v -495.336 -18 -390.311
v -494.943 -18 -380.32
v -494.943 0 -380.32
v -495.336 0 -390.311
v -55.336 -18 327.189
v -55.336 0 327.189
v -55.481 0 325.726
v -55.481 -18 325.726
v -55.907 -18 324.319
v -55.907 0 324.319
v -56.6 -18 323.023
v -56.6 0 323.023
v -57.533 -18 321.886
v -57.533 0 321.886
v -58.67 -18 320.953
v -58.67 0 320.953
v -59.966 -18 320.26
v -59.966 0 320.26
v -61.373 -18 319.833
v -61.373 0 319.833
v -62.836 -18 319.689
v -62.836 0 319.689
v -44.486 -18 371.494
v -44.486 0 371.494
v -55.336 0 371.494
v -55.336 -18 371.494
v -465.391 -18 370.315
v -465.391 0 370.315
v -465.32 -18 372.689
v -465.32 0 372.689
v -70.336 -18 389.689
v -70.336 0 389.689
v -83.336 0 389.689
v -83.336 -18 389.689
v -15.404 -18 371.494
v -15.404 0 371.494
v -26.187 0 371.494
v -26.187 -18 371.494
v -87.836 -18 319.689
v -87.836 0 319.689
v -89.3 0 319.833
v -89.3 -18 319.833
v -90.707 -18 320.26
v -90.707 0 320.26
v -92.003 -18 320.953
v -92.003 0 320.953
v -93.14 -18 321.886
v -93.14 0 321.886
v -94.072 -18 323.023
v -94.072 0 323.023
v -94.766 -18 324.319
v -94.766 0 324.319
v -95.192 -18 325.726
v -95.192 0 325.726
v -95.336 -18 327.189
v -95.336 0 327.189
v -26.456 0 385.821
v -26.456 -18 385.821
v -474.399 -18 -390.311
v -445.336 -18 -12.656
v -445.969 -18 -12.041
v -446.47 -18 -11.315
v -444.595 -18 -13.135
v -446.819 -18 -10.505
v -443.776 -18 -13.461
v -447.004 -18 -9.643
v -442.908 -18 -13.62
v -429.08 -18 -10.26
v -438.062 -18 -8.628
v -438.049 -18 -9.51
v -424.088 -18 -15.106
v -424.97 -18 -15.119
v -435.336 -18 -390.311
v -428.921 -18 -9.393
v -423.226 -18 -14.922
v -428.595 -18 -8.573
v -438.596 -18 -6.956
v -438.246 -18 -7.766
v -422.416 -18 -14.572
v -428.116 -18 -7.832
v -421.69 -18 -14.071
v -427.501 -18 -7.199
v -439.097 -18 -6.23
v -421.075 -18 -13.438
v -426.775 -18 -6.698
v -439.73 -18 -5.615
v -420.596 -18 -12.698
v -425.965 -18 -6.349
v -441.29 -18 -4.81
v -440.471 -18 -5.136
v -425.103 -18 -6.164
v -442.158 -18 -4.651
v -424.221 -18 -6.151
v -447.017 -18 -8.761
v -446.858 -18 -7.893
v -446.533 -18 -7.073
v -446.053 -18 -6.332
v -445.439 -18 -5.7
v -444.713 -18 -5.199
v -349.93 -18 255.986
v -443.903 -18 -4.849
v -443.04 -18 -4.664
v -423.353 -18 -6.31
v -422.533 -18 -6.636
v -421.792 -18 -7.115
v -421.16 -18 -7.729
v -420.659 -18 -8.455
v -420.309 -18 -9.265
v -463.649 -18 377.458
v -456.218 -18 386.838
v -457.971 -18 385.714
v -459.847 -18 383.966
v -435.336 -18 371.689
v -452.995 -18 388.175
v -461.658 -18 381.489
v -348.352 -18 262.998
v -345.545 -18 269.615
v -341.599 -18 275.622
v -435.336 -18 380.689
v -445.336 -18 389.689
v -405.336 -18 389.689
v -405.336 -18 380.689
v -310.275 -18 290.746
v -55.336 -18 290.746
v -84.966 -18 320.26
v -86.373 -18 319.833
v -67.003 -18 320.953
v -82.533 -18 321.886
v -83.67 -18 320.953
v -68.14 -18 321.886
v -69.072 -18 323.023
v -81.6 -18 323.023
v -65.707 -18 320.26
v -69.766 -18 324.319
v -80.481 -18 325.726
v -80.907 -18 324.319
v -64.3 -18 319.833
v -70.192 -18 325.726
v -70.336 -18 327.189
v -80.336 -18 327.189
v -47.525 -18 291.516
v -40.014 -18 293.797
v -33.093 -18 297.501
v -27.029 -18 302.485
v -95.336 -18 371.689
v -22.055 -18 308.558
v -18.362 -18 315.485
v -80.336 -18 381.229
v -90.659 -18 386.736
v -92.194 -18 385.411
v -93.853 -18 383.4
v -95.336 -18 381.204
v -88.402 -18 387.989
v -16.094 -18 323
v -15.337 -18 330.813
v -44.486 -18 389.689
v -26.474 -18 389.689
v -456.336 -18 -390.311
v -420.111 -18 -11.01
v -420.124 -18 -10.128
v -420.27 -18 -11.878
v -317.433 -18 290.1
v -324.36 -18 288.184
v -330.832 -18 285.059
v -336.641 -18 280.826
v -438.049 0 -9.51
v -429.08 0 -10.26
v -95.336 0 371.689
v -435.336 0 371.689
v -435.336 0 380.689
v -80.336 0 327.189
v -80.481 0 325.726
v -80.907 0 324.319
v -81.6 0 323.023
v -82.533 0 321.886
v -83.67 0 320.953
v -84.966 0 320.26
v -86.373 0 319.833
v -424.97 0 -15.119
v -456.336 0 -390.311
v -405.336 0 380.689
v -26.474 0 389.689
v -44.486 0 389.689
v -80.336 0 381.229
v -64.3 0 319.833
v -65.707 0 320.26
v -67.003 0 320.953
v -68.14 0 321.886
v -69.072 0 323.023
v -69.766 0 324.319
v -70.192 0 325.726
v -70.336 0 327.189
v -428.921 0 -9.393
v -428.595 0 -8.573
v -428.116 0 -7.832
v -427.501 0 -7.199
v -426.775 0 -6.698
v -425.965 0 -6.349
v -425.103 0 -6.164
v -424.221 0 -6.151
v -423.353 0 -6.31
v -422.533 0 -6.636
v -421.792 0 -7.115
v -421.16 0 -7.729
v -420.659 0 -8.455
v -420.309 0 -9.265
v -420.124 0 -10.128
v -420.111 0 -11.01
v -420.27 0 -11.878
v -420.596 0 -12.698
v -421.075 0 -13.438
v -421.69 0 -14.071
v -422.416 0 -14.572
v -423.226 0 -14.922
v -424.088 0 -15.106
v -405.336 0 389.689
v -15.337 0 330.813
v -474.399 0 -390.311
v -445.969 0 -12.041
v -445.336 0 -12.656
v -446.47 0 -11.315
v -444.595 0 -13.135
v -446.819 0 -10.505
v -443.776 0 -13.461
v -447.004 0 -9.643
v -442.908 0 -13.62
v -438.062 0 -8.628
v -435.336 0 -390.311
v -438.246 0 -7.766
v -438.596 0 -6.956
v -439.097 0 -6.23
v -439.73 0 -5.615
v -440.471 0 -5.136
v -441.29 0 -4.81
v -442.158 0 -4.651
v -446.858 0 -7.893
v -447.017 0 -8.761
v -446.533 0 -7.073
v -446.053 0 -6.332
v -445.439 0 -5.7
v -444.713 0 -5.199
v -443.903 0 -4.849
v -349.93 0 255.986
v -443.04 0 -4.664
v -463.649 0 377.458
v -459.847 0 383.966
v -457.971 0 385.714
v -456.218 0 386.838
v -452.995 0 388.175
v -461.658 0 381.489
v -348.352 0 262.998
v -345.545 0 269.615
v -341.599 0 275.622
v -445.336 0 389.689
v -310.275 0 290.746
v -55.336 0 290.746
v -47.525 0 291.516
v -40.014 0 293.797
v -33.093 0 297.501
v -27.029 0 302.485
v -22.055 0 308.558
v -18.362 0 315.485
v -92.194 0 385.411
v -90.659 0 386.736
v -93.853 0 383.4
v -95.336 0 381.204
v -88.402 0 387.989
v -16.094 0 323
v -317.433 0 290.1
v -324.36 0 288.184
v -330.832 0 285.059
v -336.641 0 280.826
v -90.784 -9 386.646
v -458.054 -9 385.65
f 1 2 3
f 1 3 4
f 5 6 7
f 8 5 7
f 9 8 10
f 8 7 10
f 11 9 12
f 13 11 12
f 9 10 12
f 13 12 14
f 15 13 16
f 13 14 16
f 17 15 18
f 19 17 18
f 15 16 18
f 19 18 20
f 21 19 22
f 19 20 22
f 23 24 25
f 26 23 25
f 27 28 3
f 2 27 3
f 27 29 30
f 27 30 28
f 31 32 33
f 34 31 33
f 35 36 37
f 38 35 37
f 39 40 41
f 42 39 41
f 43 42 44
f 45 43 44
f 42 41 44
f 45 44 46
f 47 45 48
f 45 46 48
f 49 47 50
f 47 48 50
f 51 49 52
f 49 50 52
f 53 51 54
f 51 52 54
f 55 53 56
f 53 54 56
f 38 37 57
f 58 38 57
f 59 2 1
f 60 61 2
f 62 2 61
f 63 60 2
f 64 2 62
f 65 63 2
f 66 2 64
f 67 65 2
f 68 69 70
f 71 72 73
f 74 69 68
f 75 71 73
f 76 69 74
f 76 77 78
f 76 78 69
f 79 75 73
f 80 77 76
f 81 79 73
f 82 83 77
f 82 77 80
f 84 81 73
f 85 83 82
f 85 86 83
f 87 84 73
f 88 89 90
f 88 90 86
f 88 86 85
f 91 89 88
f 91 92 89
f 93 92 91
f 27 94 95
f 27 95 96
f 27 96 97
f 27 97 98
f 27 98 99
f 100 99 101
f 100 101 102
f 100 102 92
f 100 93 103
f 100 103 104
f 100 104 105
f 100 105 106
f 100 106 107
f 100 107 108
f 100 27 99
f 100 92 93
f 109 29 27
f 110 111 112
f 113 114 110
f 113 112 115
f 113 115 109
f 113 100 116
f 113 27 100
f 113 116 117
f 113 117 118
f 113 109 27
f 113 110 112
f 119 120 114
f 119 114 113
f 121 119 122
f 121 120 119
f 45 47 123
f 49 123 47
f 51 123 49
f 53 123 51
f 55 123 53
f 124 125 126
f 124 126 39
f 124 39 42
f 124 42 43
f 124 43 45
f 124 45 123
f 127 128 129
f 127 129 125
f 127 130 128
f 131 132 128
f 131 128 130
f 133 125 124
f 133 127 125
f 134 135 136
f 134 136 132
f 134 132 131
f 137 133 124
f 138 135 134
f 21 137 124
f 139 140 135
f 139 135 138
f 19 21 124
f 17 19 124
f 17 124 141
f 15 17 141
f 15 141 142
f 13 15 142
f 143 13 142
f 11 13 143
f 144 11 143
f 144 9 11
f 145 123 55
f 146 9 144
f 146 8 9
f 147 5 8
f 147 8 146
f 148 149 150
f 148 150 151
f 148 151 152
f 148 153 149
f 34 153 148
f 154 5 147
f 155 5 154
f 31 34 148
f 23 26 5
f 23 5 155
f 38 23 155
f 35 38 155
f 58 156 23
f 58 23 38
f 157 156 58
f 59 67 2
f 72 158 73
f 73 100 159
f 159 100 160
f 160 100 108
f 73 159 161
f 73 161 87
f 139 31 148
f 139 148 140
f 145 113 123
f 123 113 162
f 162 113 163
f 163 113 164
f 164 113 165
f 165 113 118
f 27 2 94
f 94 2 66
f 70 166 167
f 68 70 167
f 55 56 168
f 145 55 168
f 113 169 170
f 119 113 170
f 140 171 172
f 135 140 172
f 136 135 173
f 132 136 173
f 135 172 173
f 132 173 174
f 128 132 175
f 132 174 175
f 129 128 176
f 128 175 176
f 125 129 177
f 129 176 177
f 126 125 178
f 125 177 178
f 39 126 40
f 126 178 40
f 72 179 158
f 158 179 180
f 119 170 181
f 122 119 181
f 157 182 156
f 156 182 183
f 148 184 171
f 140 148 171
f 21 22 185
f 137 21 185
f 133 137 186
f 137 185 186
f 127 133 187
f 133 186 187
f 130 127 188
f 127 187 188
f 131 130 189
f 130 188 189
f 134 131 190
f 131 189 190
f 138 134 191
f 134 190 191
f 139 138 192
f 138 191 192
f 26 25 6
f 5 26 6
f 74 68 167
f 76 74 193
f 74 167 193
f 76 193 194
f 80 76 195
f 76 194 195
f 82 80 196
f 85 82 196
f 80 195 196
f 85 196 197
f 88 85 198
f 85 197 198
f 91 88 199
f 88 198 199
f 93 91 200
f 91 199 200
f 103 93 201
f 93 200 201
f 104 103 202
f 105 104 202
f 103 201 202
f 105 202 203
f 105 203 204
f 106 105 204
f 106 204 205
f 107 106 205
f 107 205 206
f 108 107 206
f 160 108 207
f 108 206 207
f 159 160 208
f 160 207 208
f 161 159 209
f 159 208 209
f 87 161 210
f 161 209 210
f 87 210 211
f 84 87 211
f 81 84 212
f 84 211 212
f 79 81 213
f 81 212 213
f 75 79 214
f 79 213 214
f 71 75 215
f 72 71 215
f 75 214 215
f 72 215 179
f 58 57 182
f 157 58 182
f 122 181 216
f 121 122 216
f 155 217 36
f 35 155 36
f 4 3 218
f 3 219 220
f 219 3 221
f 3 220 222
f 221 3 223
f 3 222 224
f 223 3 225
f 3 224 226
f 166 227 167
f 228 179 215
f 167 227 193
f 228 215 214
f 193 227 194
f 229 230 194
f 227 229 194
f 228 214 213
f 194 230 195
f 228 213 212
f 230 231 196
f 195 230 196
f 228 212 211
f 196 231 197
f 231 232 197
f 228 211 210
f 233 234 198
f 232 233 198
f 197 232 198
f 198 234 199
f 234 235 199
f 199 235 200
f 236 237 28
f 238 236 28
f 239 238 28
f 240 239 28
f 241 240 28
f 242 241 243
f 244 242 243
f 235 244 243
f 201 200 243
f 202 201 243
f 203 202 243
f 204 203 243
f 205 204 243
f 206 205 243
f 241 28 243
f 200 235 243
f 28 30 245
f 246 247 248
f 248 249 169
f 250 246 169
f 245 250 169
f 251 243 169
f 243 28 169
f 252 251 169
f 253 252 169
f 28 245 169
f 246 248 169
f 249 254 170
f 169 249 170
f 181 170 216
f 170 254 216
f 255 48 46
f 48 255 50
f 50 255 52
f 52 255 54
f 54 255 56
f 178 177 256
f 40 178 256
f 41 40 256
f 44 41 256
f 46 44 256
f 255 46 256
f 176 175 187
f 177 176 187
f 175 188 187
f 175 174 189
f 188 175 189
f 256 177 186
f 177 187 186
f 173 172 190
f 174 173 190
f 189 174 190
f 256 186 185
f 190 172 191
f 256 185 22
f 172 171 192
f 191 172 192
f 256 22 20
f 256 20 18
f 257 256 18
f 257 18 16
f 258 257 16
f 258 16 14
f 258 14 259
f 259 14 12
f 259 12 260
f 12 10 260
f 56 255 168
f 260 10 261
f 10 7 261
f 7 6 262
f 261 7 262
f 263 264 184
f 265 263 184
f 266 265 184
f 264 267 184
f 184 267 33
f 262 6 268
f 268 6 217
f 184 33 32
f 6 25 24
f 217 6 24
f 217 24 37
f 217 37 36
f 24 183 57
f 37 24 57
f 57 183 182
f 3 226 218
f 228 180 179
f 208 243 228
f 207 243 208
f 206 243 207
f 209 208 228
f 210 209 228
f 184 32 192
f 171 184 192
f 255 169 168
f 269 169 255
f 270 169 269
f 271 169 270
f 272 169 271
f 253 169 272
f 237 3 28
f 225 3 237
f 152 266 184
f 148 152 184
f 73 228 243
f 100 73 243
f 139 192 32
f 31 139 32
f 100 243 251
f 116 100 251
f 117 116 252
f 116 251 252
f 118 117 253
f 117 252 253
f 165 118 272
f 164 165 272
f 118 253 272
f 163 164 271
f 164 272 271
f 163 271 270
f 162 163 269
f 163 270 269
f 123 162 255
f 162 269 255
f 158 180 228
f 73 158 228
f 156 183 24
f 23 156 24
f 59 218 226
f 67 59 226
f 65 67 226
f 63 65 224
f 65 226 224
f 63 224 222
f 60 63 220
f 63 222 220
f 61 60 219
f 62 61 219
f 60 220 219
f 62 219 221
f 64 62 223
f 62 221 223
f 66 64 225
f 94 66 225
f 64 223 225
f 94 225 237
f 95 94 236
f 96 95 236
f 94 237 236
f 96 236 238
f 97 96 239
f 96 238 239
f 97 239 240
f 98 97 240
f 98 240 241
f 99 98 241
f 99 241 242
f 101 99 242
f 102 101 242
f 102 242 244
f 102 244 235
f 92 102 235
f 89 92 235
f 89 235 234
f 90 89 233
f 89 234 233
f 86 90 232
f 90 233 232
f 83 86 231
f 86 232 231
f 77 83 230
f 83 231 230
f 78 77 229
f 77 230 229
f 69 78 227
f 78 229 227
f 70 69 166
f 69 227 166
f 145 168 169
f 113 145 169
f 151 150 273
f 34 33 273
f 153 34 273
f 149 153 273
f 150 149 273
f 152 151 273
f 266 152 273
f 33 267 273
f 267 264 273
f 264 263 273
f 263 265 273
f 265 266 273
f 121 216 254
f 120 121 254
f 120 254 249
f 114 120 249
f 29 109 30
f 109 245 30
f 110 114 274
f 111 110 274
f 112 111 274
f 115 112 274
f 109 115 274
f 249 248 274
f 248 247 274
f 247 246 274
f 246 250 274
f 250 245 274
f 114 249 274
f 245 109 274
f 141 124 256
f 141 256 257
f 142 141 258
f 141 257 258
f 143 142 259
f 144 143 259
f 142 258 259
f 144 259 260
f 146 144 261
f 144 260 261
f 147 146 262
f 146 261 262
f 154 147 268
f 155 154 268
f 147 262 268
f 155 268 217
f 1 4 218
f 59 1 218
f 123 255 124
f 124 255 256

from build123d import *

# Parameters (mm, degrees)
F1_DEPTH = 18


with BuildPart() as f1:
    # F0 (on Front) → F1 (new body)
    with BuildSketch(Plane.XZ):
        with BuildLine():
            Line((-494.9431181919, -380.3196549416), (-495.3364644899, -390.3106509103))
            Line((-495.3364644899, -390.3106509103), (-474.3992558025, -390.3106509103))
            Line((-474.3992558025, -390.3106509103), (-442.9078605118, -13.6198989728))
            ThreePointArc((-442.9078605118, -13.6198989728), (-445.4387975319, -5.6995339283), (-438.0486109698, -9.5104350311))
            Line((-438.0486109698, -9.5104350311), (-429.079897486, -10.2602206314))
            ThreePointArc((-429.079897486, -10.2602206314), (-421.1595324415, -7.7292836113), (-424.9704335443, -15.1194701734))
            Line((-424.9704335443, -15.1194701734), (-456.3364644899, -390.3106509103))
            Line((-456.3364644899, -390.3106509103), (-435.3364644899, -390.3106509103))
            Line((-435.3364644899, -390.3106509103), (-349.9298685588, 255.9864675478))
            ThreePointArc((-349.9298685588, 255.9864675478), (-336.6411341811, 280.8261308929), (-310.274619413, 290.7461225986))
            Line((-310.274619413, 290.7461225986), (-55.3364644899, 290.7461225986))
            ThreePointArc((-55.3364644899, 290.7461225986), (-27.0287216569, 302.4853424307), (-15.3365196272, 330.8125378136))
            Line((-15.3365196272, 330.8125378136), (-15.4040666505, 371.4941377938))
            Line((-15.4040666505, 371.4941377938), (-26.1865943467, 371.4941377938))
            Line((-26.1865943467, 371.4941377938), (-26.4555723936, 385.8212303749))
            Line((-26.4555723936, 385.8212303749), (-26.474497292, 389.6893490897))
            Line((-26.474497292, 389.6893490897), (-44.4864644899, 389.6893490897))
            Line((-44.4864644899, 389.6893490897), (-44.4864644899, 371.4941377938))
            Line((-44.4864644899, 371.4941377938), (-55.3364644899, 371.4941377938))
            Line((-55.3364644899, 371.4941377938), (-55.3364644899, 327.1893490897))
            ThreePointArc((-55.3364644899, 327.1893490897), (-57.533163631, 321.8860482309), (-62.8364644899, 319.6893490897))
            ThreePointArc((-62.8364644899, 319.6893490897), (-68.1397653488, 321.8860482309), (-70.3364644899, 327.1893490897))
            Line((-70.3364644899, 327.1893490897), (-70.3364644899, 389.6893490897))
            Line((-70.3364644899, 389.6893490897), (-83.3364644899, 389.6893490897))
            add(Edge.make_bspline(
                [(-83.3364644899, 389.6893490897), (-86.0423866242, 388.9113420461), (-91.2893973468, 387.4027209189), (-94.0159938946, 383.2265543698), (-95.3364644899, 381.2040677155)],
                knots=[0, 0, 0, 0, 0.5157073765, 1, 1, 1, 1], degree=3))
            Line((-95.3364644899, 381.2040677155), (-80.3364644899, 381.2289734555))
            Line((-80.3364644899, 381.2289734555), (-80.3364644899, 327.1893490897))
            ThreePointArc((-80.3364644899, 327.1893490897), (-82.533163631, 321.8860482309), (-87.8364644899, 319.6893490897))
            ThreePointArc((-87.8364644899, 319.6893490897), (-93.1397653488, 321.8860482309), (-95.3364644899, 327.1893490897))
            Line((-95.3364644899, 327.1893490897), (-95.3364644899, 370.6893490897))
            Line((-95.3364644899, 370.6893490897), (-95.3364644899, 371.6893490897))
            Line((-95.3364644899, 371.6893490897), (-435.3364644899, 371.6893490897))
            Line((-435.3364644899, 371.6893490897), (-435.3364644899, 375.1893490897))
            Line((-435.3364644899, 375.1893490897), (-435.3364644899, 376.1893490897))
            Line((-435.3364644899, 376.1893490897), (-435.3364644899, 380.6893490897))
            Line((-435.3364644899, 380.6893490897), (-405.3364644899, 380.6893490897))
            Line((-405.3364644899, 380.6893490897), (-405.3364644899, 389.6893490897))
            Line((-405.3364644899, 389.6893490897), (-445.3364644899, 389.6893490897))
            add(Edge.make_bspline(
                [(-445.3364644899, 389.6893490897), (-450.2049500524, 389.0615823794), (-459.5920285383, 387.2680457186), (-463.5495128465, 378.4364704972), (-465.3198116993, 372.6887939967)],
                knots=[0, 0, 0, 0, 0.4865626406, 1, 1, 1, 1], degree=3))
            Line((-465.3198116993, 372.6887939967), (-465.3905866055, 370.3146473532))
            Line((-465.3905866055, 370.3146473532), (-494.9431181919, -380.3196549416))
        make_face()
    extrude(amount=F1_DEPTH)


solid = f1.part
